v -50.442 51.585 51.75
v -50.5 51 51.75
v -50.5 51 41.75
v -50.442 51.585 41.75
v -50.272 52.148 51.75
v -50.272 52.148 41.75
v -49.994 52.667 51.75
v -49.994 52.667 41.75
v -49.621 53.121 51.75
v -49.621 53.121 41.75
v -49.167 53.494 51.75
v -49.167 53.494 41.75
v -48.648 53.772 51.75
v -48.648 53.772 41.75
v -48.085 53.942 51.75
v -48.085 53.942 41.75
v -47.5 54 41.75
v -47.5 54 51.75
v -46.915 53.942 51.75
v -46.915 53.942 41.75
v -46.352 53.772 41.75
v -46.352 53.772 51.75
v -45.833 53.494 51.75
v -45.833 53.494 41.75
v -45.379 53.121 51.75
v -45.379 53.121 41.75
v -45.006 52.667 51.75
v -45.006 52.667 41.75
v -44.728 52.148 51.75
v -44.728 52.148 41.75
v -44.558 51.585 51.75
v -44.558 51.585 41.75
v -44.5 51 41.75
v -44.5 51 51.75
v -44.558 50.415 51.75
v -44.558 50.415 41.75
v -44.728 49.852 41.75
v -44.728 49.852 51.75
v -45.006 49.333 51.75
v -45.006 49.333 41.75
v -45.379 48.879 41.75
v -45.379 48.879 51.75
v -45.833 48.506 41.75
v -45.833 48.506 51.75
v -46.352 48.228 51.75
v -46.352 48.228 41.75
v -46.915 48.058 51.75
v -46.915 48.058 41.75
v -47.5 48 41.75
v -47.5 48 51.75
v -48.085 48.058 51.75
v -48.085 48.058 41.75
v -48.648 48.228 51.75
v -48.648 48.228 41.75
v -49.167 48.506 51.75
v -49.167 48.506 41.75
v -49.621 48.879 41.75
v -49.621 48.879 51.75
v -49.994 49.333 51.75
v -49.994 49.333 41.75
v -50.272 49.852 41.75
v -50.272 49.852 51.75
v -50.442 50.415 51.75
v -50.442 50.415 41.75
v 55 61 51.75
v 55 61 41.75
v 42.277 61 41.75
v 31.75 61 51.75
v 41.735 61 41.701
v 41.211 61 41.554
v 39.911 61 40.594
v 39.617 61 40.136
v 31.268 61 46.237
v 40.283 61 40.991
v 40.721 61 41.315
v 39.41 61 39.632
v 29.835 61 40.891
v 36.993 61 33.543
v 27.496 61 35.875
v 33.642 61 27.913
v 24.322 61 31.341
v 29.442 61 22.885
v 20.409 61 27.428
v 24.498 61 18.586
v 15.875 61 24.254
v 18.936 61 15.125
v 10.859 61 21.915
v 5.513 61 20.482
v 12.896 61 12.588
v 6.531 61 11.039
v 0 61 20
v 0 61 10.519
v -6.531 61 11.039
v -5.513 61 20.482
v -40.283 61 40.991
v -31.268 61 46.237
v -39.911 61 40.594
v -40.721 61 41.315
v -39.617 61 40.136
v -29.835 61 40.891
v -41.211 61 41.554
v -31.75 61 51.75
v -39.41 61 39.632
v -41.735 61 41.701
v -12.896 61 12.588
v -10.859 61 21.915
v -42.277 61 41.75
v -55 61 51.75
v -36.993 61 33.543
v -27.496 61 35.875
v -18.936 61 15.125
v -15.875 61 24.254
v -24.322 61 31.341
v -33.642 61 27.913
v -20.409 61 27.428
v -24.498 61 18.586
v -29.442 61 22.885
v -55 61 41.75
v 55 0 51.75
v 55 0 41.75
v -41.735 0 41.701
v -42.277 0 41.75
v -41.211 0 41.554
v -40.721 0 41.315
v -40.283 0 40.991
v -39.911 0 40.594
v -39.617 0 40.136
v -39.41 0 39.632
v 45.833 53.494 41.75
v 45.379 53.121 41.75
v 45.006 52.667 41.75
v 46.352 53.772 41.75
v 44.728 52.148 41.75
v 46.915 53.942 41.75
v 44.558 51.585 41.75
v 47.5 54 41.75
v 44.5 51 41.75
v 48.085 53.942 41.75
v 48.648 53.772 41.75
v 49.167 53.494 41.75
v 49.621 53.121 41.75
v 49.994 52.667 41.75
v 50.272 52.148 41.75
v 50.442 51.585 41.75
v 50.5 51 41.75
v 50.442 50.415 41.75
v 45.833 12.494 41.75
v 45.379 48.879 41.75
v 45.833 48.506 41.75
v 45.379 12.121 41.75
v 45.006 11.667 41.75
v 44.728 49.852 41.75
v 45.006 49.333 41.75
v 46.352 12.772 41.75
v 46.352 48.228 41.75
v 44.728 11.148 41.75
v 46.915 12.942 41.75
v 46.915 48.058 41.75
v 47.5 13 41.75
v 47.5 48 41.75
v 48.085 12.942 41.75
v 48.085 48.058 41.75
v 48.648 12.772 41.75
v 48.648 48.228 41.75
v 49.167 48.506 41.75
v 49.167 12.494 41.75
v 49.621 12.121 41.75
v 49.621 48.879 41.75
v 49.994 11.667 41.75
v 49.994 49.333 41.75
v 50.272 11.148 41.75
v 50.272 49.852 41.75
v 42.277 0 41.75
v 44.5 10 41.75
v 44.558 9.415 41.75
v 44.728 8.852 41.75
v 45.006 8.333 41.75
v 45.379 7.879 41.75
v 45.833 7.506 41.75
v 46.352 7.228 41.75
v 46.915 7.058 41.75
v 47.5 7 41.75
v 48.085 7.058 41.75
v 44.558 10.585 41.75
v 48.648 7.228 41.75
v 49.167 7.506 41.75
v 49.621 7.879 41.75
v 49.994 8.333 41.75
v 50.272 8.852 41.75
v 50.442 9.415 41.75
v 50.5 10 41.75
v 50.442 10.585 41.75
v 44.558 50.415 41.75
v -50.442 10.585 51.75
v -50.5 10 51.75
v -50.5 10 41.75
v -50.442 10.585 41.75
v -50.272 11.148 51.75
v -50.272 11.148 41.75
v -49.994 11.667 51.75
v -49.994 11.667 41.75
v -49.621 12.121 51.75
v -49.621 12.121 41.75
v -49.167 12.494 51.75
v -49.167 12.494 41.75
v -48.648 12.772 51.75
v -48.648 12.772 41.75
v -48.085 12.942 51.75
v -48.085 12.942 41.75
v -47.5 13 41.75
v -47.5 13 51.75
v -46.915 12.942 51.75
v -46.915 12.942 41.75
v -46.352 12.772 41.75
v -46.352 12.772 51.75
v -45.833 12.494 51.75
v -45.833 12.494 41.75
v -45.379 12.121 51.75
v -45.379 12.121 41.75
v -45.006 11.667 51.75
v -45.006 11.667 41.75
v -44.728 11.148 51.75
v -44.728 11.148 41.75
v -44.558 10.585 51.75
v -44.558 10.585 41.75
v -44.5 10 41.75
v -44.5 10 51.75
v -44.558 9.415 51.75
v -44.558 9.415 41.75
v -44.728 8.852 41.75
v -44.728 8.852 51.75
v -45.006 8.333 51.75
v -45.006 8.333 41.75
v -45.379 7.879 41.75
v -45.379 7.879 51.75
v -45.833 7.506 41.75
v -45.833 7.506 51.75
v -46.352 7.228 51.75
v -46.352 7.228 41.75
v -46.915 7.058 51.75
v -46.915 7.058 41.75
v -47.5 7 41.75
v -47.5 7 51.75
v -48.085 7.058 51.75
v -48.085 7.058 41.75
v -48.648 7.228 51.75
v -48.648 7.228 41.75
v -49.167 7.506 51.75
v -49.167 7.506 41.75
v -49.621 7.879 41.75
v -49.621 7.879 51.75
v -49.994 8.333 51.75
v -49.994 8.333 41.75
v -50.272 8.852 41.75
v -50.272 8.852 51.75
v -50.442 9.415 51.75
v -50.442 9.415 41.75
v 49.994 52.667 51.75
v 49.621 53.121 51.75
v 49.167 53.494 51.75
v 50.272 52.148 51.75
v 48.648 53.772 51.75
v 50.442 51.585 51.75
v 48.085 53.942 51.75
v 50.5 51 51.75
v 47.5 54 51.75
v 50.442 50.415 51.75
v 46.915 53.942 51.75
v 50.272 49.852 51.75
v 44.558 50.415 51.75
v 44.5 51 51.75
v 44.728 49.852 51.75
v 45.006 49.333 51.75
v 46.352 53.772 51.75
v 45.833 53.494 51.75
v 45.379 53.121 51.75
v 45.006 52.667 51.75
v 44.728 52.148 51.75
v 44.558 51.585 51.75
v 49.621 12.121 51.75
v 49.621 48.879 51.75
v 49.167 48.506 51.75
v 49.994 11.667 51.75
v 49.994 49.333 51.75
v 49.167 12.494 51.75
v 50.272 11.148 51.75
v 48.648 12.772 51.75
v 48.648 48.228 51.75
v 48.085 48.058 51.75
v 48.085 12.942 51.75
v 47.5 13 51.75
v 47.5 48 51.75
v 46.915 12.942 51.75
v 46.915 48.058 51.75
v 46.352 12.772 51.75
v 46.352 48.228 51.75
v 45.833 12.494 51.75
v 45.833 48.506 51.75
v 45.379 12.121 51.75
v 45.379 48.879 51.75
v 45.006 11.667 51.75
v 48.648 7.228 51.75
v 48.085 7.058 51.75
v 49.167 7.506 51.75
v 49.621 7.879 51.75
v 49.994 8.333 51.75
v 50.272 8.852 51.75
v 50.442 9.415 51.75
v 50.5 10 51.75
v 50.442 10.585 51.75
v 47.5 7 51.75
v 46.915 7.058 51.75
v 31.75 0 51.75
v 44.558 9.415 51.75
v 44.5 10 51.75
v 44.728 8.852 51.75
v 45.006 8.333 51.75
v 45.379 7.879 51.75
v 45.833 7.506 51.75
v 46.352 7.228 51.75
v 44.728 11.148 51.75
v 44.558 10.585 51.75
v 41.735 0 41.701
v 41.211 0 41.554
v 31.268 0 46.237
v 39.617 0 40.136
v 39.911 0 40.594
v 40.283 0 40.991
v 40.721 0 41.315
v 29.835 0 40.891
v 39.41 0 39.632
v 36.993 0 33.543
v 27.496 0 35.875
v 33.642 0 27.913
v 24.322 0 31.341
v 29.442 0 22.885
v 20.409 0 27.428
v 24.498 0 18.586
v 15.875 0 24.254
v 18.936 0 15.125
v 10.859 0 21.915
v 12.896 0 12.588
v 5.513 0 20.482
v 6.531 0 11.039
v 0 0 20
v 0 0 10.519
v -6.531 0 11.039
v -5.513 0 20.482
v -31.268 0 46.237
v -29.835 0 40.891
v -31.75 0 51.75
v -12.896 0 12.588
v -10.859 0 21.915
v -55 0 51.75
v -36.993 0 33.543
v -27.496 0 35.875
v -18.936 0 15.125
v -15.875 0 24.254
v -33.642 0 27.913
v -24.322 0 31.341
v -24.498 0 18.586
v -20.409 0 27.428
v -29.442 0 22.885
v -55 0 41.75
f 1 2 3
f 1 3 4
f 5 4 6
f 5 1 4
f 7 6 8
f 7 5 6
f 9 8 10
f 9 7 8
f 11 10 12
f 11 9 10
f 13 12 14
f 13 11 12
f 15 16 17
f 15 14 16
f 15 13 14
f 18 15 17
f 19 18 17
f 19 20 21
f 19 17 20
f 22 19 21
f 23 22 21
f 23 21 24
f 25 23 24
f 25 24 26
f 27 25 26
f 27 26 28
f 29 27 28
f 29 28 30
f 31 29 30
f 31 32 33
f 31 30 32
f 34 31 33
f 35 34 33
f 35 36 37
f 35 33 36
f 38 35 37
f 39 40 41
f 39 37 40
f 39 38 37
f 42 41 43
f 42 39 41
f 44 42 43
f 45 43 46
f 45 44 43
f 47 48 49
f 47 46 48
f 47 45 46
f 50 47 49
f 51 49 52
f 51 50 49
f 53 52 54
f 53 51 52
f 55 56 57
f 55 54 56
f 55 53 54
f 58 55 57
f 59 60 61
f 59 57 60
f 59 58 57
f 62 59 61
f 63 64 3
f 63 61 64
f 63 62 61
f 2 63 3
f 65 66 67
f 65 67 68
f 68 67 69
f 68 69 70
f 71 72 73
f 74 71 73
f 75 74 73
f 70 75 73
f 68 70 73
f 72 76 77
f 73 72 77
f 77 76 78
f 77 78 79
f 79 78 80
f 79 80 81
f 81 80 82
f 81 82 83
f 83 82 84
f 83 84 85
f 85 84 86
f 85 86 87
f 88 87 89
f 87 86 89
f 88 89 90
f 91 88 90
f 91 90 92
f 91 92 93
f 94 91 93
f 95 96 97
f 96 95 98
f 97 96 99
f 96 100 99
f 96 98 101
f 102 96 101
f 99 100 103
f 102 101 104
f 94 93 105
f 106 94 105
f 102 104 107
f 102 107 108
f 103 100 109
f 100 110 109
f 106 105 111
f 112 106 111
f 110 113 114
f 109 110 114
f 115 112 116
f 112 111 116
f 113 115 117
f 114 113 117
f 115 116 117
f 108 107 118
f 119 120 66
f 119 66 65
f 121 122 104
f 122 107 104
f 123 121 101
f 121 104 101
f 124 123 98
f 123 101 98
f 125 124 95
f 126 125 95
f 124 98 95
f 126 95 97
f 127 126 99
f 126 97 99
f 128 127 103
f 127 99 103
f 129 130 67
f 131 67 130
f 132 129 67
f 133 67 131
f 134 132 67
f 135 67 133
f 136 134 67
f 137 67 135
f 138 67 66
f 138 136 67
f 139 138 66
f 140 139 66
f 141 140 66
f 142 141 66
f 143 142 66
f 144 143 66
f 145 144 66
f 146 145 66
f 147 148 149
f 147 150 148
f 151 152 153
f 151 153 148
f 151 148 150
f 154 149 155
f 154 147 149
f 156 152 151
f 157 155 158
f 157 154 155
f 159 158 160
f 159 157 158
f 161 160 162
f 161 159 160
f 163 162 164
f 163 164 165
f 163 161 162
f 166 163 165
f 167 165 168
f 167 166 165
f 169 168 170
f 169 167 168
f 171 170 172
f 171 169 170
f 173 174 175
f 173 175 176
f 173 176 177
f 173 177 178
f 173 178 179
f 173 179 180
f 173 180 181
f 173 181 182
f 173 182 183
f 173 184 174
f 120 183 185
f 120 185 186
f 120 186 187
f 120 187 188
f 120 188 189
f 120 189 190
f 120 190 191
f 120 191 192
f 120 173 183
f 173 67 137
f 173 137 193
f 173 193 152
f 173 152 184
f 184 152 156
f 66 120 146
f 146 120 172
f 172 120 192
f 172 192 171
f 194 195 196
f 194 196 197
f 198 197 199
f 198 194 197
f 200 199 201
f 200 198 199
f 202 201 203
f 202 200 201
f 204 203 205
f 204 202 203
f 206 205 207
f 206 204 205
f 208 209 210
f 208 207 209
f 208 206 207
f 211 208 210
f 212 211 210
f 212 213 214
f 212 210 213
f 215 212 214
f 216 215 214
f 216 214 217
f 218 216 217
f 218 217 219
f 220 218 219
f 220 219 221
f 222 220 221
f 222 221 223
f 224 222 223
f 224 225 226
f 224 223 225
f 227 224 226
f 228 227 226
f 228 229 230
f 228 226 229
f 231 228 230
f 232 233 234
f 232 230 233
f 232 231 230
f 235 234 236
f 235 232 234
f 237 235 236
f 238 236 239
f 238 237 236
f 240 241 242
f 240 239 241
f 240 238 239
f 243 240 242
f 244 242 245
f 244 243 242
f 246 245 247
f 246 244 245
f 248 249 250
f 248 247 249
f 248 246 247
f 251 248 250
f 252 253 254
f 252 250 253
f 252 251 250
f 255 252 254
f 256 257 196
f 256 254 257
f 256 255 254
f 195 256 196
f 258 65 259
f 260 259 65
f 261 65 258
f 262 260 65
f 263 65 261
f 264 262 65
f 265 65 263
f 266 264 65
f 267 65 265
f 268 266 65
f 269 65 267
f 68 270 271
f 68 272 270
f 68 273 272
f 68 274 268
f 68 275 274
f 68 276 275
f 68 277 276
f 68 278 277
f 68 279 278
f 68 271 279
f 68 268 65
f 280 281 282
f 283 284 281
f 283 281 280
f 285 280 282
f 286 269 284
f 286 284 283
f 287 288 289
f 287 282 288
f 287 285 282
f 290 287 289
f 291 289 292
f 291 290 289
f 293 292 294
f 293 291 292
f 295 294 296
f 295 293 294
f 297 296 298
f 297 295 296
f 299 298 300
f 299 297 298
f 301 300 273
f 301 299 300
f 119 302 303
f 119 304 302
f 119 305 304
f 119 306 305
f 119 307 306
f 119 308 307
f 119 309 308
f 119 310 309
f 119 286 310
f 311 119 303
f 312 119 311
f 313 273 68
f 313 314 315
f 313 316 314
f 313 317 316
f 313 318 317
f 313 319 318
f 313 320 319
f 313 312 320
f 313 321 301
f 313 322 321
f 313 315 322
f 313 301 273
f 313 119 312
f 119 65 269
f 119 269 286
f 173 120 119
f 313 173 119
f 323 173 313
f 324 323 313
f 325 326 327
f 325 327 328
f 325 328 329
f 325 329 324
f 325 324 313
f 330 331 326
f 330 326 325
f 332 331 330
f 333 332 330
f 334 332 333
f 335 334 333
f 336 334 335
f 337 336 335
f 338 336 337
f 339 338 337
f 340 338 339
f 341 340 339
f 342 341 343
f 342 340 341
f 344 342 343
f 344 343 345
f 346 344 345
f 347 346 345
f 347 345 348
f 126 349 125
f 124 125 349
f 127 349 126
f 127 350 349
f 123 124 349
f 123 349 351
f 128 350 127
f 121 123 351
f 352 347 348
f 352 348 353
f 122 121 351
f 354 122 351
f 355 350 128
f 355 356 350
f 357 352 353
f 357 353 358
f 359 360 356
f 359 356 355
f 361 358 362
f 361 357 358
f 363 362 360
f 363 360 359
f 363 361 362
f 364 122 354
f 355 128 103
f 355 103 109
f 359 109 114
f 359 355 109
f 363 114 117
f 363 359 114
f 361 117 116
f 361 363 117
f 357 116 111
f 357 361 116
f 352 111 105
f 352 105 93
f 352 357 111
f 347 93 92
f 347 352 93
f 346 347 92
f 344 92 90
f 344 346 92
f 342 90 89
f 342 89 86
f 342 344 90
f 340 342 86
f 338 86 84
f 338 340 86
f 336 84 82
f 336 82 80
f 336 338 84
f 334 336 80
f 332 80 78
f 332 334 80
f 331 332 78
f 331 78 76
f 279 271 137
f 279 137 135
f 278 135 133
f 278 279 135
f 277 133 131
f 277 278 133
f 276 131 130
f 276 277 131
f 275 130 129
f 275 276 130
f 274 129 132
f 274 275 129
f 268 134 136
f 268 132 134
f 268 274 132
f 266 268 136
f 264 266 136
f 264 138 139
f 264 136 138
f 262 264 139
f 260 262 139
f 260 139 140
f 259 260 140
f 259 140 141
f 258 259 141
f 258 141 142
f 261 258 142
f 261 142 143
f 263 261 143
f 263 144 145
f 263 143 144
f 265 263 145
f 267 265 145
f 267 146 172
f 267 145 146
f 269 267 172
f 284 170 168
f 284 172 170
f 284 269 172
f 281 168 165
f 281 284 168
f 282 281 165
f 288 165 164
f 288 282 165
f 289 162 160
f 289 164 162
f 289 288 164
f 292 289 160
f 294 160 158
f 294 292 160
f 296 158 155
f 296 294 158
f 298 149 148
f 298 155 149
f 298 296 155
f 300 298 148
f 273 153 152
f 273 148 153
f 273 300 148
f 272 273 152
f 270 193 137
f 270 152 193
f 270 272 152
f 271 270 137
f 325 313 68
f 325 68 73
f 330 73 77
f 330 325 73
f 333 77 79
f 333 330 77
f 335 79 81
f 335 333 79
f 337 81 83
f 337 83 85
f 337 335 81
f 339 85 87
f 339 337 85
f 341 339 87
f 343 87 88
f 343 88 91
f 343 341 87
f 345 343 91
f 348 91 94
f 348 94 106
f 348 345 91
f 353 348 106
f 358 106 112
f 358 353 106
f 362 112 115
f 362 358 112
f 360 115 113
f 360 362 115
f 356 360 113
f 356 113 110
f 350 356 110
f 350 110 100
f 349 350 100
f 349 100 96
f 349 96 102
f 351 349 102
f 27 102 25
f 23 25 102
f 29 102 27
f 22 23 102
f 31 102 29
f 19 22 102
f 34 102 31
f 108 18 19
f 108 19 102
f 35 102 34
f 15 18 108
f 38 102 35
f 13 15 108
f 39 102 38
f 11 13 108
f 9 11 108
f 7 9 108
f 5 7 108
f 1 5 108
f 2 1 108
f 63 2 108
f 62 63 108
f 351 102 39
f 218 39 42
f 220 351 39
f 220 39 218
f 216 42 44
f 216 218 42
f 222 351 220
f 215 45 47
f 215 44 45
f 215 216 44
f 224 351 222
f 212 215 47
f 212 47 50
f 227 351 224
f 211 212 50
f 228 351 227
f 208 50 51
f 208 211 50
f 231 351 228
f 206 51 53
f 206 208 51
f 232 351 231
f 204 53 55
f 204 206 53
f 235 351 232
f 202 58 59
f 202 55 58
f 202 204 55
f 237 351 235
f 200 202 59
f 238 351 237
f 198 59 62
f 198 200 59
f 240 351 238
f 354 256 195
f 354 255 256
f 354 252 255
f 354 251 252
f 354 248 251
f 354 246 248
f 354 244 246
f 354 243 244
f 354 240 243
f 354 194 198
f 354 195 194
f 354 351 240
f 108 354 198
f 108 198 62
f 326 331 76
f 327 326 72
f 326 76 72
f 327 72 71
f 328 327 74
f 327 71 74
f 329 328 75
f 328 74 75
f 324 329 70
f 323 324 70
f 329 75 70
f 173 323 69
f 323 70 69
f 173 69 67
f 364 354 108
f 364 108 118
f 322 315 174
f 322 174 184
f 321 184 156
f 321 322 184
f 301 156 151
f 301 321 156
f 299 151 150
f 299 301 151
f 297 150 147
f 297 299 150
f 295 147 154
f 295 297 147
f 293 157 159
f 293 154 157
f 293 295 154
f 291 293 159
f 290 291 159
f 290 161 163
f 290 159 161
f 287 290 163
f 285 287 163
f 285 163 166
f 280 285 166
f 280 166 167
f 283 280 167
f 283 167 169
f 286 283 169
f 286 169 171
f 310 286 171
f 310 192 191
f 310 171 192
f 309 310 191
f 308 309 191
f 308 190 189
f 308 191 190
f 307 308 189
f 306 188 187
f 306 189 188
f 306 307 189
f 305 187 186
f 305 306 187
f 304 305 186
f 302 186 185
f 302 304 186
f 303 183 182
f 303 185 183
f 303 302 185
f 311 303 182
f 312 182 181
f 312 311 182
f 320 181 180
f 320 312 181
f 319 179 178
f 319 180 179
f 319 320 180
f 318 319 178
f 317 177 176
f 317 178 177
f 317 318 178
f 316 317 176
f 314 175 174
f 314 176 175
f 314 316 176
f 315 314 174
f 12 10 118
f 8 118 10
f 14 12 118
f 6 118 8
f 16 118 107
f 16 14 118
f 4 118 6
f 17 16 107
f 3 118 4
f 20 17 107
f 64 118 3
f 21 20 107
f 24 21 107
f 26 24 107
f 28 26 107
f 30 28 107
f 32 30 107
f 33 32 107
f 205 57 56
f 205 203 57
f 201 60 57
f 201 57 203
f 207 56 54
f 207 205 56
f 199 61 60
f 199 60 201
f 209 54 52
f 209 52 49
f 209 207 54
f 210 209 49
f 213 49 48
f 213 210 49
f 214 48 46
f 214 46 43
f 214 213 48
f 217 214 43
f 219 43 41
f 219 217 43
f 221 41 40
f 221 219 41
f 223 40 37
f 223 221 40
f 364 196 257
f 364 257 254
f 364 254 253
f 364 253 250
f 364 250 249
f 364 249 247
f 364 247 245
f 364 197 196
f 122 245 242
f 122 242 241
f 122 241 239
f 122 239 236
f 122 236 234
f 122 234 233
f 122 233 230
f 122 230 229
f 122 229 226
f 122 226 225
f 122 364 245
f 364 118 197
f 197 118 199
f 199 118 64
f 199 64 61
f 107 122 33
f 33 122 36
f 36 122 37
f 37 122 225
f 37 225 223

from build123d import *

# Parameters (mm, degrees)
BOSS_EXTRUDE1_DEPTH     = 61
CUT_EXTRUDE1_DEPTH      = 88.871376881
CUT_EXTRUDE1_DEPTH_BACK = 88.871376881
SKETCH2_R               = 3
FILLET1_R               = 3


with BuildPart() as part:
    # Sketch1 → Boss-Extrude1 (new body)
    with BuildSketch(Plane(origin=(0, 0, 0), x_dir=(1, 0, 0), z_dir=(0, 1, 0))):
        with BuildLine():
            Line((40, -51.75), (31.75, -51.75))
            ThreePointArc((31.75, -51.75), (0, -20), (-31.75, -51.75))
            Line((-31.75, -51.75), (-40, -51.75))
            Line((-40, -51.75), (-55, -51.75))
            Line((-55, -51.75), (-55, -41.75))
            Line((-55, -41.75), (-40, -41.75))
            ThreePointArc((-40, -41.75), (0, -10.518943744), (40, -41.75))
            Line((40, -41.75), (55, -41.75))
            Line((55, -41.75), (55, -51.75))
            Line((55, -51.75), (40, -51.75))
        make_face()
    extrude(amount=BOSS_EXTRUDE1_DEPTH)

    # Sketch2 → Cut-Extrude1 (cut, two sides: drawn at the far end of the back side and taken through both)
    with BuildSketch(Plane(origin=(0, 0, 41.75), x_dir=(-1, 0, 0), z_dir=(0, 0, -1)).offset(-CUT_EXTRUDE1_DEPTH_BACK)):
        with Locations((-47.5, 51)):
            Circle(SKETCH2_R)
        with Locations((-47.5, 10)):
            Circle(SKETCH2_R)
        with Locations((47.5, 10)):
            Circle(SKETCH2_R)
        with Locations((47.5, 51)):
            Circle(SKETCH2_R)
    extrude(amount=CUT_EXTRUDE1_DEPTH + CUT_EXTRUDE1_DEPTH_BACK, mode=Mode.SUBTRACT)

    # Fillet1
    fillet1_edges = [part.edges().sort_by_distance(p)[0] for p in [
        (-40, 30.5, 41.75),
        (40, 30.5, 41.75),
    ]]
    fillet(fillet1_edges, radius=FILLET1_R)


solid = part.part
